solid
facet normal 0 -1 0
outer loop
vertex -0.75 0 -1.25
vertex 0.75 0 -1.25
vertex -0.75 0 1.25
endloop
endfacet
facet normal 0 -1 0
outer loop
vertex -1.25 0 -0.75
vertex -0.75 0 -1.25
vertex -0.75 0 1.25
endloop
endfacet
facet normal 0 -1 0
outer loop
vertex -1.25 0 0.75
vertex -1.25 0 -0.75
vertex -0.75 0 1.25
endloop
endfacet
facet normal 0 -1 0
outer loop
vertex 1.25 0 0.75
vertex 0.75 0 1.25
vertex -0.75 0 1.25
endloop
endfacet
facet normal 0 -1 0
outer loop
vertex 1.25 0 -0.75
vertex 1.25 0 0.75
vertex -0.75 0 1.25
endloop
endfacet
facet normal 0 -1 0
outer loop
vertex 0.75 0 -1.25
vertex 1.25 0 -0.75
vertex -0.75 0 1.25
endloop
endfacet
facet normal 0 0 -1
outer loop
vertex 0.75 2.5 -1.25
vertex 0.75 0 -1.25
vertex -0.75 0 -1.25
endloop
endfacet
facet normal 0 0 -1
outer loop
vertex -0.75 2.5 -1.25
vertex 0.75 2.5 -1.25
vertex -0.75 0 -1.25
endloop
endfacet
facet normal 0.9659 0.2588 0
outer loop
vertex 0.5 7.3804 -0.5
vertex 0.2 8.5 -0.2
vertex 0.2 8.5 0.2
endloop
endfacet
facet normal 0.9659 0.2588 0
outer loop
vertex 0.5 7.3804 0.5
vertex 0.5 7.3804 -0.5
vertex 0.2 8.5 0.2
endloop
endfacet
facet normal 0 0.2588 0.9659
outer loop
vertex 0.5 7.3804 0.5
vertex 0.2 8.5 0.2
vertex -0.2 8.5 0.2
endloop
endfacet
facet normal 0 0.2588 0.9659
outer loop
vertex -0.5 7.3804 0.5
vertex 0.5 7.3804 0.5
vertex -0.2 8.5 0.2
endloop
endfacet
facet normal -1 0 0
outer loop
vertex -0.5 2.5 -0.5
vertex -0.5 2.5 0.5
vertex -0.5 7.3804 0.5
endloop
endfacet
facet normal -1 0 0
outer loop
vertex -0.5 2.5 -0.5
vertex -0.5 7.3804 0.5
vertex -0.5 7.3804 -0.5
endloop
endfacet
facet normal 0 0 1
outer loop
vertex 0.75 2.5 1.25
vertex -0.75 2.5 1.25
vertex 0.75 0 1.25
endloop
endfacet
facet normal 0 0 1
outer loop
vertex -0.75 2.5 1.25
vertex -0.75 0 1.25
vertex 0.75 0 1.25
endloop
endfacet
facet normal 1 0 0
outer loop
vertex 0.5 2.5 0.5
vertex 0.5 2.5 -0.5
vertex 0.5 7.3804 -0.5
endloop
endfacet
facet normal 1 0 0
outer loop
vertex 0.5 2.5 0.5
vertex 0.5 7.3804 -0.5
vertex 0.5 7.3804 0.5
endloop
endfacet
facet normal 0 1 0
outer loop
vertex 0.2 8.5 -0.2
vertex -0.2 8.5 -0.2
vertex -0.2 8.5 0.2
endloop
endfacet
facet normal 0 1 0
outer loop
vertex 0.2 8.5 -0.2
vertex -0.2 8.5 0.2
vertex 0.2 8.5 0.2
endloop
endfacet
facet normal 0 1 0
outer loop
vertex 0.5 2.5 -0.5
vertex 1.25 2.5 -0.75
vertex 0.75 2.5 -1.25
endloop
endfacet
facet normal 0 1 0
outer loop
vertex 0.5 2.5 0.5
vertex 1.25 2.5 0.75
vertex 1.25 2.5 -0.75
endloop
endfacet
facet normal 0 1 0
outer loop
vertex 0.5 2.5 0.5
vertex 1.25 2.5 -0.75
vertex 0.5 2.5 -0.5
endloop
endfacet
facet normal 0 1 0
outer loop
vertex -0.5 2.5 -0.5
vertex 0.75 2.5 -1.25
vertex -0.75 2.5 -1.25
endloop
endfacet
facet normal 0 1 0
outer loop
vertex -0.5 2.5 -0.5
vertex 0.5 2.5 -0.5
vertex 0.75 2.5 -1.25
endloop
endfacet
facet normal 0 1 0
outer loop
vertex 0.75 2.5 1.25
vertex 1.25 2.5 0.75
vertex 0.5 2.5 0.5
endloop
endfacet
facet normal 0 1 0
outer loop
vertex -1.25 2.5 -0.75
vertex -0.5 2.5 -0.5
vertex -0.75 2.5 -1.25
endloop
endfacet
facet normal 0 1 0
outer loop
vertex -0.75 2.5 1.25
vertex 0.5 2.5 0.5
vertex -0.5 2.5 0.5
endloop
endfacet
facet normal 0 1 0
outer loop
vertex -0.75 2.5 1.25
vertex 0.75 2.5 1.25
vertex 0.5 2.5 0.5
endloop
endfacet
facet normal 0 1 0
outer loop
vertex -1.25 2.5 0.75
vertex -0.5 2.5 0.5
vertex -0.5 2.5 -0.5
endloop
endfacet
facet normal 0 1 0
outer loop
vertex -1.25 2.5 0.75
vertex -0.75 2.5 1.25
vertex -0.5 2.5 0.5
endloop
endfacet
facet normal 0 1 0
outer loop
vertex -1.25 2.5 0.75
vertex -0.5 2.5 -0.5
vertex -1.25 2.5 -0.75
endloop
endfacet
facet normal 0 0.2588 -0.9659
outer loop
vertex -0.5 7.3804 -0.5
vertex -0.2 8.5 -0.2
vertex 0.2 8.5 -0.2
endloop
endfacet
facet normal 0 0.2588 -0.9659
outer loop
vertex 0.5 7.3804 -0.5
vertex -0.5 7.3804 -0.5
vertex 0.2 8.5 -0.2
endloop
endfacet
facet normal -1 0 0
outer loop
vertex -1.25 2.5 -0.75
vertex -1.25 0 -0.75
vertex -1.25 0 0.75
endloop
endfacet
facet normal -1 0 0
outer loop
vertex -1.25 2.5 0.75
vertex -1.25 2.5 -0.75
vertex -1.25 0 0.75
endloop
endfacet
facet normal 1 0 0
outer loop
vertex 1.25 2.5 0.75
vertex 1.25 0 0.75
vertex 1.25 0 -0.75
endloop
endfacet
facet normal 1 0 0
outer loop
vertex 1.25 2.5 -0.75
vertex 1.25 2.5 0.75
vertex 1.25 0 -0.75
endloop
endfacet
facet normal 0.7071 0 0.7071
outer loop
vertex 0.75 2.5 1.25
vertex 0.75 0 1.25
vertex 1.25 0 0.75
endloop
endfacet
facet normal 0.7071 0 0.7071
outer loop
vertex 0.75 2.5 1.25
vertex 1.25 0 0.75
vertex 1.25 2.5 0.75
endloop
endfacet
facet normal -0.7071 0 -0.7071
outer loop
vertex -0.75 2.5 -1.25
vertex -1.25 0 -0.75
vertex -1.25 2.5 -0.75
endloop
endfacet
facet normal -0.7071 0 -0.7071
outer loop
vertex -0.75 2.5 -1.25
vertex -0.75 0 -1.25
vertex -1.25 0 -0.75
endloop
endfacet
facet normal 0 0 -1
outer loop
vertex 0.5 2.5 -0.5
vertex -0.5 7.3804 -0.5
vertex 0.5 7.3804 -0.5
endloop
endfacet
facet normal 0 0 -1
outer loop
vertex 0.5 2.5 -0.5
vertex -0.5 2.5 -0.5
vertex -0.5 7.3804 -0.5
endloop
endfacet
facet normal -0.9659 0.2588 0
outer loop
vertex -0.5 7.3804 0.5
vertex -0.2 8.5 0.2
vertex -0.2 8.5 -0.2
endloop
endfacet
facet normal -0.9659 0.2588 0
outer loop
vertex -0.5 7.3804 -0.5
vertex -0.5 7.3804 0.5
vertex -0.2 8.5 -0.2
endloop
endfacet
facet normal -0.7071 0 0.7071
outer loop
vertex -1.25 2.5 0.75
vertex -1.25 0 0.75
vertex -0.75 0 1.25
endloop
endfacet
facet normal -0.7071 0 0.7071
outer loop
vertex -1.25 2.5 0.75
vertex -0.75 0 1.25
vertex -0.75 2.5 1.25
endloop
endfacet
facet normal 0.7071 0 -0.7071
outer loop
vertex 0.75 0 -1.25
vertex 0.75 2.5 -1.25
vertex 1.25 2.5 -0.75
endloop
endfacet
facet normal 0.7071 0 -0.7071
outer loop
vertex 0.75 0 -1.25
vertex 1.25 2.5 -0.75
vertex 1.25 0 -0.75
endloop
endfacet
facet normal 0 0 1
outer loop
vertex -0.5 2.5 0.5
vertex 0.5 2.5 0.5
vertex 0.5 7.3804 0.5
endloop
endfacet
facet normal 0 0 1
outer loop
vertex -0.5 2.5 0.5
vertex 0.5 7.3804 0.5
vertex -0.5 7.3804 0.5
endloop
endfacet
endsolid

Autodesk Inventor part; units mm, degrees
ref_plane "YZ Plane" through (0, 0, 0) normal (1, 0, 0) x (0, 1, 0)
ref_plane "XZ Plane" through (0, 0, 0) normal (0, 1, 0) x (-1, 0, 0)
ref_plane "XY Plane" through (0, 0, 0) normal (0, 0, 1) x (1, 0, 0)
sketch "Sketch1" plane through (0, 0, 0) normal (0, 1, 0) x (-1, 0, 0)
  line L0 (-1.25, -1.25) -> (1.25, -1.25)
  line L1 (1.25, -1.25) -> (1.25, 1.25)
  line L2 (1.25, 1.25) -> (-1.25, 1.25)
  line L3 (-1.25, 1.25) -> (-1.25, -1.25)
  line L4 (-1.25, -1.25) -> (1.25, 1.25) construction
  line L5 (1.25, -1.25) -> (-1.25, 1.25) construction
  point P0 (0, 0)
  dimension "d0" = 2.5
  dimension "d1" = 2.5
extrude "Extrusion1" add sketch "Sketch1" along normal blind 2.5
chamfer "Chamfer1" distance 0.5 angle 45 4 edges at (1.25, 1.25, 1.25) (-1.25, 1.25, 1.25) (1.25, 1.25, -1.25) (-1.25, 1.25, -1.25)
sketch "Sketch2" plane through (0, 2.5, 0) normal (0, 1, 0) x (1, 0, 0)
  line L0 (-0.5, 0.5) -> (0.5, 0.5)
  line L1 (0.5, 0.5) -> (0.5, -0.5)
  line L2 (0.5, -0.5) -> (-0.5, -0.5)
  line L3 (-0.5, -0.5) -> (-0.5, 0.5)
  point P0 (0, 0)
  dimension "d7" = 1
  dimension "d9" = 1
  dimension "d10" = 0.5
  dimension "d11" = 0.5
extrude "Extrusion2" add sketch "Sketch2" along normal blind 6
chamfer "Chamfer2" distance 0.3 angle 75 4 edges at (0, 8.5, 0.5) (-0.5, 8.5, 0) (0, 8.5, -0.5) (0.5, 8.5, 0) measured on face at (-0.1667, 8.5, -0.1667)
properties part number "nanopc_t4_pin"
